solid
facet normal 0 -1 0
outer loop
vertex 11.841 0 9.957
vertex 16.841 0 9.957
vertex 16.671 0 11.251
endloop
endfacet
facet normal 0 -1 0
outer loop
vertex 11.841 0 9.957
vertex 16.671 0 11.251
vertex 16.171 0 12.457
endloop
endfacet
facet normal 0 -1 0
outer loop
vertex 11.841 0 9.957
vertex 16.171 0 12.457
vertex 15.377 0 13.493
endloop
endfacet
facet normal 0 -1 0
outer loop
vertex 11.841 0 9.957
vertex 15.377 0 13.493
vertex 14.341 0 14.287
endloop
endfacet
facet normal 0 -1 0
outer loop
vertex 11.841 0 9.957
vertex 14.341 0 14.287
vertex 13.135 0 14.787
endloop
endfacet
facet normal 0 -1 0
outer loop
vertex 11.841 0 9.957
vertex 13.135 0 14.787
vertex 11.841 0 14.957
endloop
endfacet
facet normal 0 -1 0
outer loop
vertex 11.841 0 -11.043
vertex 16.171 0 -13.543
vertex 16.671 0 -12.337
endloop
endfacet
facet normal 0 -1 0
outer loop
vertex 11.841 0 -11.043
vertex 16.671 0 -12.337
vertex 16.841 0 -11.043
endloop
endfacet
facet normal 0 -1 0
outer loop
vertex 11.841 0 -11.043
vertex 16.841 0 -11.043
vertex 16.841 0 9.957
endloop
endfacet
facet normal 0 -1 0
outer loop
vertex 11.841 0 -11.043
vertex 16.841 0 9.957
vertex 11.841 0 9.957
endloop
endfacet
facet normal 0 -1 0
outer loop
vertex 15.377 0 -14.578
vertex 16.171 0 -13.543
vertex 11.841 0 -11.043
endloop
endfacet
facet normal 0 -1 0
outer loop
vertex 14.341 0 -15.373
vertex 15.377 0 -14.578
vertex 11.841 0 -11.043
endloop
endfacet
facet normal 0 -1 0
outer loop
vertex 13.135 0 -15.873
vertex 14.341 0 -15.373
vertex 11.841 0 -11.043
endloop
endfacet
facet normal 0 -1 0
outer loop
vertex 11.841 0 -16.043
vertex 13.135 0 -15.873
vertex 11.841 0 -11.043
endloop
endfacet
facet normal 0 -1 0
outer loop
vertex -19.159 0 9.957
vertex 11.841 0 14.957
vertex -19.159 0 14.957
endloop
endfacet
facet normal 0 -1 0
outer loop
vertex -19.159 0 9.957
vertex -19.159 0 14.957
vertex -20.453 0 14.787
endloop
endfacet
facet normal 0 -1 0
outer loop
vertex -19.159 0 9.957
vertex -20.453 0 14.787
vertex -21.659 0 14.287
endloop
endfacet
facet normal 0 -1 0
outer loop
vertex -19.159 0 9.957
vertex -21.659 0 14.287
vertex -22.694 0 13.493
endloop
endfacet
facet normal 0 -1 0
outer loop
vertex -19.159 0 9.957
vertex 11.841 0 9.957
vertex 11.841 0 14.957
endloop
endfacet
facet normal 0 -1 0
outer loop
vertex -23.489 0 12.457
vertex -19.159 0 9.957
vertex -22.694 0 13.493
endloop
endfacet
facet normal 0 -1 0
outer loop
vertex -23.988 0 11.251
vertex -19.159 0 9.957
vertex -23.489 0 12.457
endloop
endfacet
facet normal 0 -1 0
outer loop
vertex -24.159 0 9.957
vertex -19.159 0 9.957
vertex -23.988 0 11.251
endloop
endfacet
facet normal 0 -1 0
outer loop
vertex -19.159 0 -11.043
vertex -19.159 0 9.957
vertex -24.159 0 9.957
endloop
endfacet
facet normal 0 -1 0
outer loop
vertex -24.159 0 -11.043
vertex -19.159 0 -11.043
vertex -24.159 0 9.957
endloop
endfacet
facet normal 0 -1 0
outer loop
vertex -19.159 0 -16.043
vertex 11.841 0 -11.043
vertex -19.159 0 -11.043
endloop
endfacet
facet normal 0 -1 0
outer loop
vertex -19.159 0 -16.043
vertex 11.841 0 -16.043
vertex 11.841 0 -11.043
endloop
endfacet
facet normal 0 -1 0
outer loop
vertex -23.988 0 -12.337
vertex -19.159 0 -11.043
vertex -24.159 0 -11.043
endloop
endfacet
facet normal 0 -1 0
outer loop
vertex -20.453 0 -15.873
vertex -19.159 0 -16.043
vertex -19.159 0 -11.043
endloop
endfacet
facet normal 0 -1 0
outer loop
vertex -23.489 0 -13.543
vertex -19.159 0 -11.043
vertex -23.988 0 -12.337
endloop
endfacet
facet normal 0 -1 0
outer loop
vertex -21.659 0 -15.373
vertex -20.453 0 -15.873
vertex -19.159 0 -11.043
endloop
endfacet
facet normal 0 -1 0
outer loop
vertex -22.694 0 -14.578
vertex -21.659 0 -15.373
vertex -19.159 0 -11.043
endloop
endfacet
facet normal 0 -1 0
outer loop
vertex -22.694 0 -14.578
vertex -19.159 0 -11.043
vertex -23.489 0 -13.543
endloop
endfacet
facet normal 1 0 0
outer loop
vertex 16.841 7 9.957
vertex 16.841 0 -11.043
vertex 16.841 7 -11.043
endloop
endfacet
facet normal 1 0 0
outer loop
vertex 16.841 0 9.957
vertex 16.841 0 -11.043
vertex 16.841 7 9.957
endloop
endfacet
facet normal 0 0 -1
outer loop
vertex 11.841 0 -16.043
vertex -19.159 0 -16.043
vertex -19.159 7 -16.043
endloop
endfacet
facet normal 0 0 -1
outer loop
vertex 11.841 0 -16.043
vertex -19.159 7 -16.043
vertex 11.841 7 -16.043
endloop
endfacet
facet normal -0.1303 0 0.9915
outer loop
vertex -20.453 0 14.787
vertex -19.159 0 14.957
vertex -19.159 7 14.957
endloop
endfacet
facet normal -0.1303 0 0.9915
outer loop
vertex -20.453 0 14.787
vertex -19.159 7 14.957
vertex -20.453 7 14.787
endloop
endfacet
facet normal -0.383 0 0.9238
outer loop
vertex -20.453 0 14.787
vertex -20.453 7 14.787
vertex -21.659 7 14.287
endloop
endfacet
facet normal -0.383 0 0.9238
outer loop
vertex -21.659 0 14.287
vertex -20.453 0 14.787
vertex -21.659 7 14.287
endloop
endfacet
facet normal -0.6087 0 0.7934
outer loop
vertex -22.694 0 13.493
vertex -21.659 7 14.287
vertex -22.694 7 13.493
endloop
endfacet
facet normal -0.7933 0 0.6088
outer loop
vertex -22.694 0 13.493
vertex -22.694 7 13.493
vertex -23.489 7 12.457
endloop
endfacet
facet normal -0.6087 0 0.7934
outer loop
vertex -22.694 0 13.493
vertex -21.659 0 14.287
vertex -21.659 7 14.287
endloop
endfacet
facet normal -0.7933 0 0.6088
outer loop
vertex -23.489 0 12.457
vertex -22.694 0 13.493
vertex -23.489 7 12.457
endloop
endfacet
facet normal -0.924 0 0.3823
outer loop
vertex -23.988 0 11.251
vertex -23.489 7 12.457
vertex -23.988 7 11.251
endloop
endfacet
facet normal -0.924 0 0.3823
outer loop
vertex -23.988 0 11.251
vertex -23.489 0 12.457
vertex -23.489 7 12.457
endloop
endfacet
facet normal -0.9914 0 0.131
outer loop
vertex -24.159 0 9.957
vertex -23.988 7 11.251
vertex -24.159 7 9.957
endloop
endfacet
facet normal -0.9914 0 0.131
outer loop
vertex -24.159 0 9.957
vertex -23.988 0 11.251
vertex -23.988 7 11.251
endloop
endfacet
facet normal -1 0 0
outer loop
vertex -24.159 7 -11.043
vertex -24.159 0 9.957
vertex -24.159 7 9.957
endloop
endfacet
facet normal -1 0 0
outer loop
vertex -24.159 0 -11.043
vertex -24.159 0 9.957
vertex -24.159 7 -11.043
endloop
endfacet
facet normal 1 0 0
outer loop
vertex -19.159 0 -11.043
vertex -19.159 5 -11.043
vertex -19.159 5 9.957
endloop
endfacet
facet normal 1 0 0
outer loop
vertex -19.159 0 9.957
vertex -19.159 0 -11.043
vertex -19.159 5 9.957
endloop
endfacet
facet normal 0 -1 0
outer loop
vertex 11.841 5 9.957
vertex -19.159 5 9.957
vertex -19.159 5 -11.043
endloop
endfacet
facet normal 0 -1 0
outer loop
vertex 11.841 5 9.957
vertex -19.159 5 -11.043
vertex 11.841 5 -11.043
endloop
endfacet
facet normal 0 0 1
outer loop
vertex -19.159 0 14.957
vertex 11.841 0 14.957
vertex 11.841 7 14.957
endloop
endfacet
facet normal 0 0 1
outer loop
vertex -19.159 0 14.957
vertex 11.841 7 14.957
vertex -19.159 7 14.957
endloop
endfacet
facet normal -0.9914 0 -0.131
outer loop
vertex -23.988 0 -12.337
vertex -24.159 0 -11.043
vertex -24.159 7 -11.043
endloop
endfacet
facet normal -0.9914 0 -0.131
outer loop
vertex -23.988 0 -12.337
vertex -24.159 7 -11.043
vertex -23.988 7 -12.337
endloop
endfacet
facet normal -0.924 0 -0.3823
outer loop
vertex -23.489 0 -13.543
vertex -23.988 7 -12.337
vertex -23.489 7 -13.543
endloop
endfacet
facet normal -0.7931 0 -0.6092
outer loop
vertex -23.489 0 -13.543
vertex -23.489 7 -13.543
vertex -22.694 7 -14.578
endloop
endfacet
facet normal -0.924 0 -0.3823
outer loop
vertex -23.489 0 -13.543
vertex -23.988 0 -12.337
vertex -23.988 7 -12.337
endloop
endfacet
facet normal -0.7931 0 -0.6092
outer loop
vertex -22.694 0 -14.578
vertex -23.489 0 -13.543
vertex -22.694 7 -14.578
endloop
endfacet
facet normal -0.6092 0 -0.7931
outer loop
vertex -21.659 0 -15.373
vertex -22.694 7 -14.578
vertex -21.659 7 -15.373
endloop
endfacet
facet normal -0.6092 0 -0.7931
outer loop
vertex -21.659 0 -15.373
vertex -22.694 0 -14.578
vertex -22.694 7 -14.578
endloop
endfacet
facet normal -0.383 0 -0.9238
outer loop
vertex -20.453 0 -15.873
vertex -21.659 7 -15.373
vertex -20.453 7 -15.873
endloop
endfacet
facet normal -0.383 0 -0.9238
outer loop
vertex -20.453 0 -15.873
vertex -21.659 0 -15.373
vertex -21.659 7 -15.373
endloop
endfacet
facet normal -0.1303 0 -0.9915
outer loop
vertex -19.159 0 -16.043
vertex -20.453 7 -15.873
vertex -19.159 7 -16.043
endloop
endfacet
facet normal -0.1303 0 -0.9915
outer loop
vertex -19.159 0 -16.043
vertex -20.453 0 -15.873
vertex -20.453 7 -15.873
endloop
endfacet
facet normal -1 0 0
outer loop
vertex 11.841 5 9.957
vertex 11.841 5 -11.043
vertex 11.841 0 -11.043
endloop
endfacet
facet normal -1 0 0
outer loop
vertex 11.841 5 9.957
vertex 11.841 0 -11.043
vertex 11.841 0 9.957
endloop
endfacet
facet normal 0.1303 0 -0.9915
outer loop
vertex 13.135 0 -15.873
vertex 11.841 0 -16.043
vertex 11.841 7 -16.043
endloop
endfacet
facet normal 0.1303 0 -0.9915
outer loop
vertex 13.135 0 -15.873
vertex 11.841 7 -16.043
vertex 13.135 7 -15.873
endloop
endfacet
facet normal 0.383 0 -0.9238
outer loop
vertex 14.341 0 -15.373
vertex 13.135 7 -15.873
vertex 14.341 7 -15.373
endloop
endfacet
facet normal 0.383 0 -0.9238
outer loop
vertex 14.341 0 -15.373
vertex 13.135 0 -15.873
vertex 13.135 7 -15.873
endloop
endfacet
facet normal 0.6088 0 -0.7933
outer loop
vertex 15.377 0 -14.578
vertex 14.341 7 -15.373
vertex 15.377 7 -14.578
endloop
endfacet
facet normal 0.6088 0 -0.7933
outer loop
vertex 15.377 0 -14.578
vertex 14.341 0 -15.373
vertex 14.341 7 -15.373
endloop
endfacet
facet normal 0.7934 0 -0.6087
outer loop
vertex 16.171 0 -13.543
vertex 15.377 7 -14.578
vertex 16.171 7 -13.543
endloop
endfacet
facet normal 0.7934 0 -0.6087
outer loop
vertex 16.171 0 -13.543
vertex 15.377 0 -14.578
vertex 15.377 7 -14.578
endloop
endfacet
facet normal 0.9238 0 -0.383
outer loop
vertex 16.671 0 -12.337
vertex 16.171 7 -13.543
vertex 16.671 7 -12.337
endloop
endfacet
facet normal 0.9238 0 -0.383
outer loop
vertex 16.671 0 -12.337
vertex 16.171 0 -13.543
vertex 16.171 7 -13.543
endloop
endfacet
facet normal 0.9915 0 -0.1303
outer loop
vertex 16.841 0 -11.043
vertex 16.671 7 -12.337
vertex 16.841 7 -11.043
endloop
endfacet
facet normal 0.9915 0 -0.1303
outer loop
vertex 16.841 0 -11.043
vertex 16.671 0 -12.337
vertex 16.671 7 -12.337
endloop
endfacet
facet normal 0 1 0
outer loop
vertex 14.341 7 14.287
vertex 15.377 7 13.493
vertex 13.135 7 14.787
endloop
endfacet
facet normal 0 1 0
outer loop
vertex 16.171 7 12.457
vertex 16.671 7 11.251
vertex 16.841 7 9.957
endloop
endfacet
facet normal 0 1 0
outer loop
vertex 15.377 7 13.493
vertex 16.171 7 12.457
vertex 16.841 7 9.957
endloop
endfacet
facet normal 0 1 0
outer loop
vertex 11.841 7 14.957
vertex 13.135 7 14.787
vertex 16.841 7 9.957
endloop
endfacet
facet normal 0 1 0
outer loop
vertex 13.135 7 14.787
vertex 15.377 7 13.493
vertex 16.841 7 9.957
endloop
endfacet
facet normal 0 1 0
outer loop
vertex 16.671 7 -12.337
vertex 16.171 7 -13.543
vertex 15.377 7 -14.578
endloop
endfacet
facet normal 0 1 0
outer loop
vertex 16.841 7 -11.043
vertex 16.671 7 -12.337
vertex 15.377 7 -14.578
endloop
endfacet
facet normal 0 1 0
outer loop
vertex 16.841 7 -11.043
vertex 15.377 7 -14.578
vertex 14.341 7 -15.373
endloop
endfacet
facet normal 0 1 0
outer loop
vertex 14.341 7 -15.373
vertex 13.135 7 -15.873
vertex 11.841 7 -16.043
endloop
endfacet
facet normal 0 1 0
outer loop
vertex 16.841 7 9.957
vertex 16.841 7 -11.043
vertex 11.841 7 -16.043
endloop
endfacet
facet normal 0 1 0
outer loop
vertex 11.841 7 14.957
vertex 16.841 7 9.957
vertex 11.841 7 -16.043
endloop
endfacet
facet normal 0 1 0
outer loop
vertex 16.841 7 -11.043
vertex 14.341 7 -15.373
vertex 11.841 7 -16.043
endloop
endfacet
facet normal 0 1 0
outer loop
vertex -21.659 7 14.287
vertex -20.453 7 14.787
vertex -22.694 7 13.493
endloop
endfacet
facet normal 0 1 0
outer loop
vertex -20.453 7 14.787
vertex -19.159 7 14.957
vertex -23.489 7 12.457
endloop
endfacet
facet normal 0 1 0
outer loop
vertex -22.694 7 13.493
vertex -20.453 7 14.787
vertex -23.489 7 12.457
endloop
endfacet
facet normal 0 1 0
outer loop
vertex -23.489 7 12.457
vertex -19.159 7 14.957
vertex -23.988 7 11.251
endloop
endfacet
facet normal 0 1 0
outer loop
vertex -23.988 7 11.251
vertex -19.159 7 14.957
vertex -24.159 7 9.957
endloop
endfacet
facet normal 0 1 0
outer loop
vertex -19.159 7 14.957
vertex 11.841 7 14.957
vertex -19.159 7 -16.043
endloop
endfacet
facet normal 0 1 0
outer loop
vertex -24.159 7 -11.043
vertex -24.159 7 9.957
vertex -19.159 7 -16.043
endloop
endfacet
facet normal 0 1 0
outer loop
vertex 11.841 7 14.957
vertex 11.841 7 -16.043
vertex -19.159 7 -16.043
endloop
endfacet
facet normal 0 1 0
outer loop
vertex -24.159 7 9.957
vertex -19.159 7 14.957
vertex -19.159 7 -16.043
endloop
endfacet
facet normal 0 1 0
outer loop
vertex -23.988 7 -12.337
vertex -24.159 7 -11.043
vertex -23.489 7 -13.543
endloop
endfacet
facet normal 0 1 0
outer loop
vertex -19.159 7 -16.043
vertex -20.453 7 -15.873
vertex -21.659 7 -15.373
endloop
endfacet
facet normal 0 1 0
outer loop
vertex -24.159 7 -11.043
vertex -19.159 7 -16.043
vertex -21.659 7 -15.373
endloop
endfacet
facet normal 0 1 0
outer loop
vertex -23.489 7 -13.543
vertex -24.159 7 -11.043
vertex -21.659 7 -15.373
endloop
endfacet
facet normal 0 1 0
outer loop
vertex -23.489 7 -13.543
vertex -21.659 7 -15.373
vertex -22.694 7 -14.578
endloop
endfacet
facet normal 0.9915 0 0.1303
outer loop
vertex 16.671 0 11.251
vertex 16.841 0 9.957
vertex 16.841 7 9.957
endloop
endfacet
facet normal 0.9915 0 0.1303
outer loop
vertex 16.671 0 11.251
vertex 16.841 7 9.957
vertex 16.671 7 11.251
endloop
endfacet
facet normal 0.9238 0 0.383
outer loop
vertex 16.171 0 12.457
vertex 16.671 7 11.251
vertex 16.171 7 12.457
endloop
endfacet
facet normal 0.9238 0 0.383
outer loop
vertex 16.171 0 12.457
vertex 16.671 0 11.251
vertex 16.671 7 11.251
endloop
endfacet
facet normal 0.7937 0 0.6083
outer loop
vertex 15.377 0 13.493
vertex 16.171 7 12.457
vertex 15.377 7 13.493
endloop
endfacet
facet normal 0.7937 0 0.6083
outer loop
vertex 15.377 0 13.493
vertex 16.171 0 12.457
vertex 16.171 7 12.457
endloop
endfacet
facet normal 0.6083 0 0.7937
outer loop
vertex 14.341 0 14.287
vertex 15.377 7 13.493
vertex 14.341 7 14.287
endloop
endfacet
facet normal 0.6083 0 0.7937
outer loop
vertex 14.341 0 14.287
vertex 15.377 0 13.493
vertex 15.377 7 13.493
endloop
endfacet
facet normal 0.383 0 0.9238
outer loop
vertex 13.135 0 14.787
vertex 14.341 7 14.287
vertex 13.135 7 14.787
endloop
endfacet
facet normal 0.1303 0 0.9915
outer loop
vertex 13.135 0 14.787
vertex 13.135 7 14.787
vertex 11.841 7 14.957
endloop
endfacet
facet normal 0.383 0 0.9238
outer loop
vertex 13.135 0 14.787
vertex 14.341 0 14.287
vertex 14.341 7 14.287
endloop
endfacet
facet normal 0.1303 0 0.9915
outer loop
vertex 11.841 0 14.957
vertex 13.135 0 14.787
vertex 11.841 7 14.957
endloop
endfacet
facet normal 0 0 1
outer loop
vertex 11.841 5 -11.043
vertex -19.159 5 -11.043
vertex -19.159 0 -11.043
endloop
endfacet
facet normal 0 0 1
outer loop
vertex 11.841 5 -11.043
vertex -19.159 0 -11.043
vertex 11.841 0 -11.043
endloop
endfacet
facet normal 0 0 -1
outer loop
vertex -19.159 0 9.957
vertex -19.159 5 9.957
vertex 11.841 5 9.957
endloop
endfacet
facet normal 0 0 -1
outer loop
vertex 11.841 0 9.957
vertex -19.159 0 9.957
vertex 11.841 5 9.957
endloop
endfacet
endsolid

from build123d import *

# Parameters (mm, degrees)
BOSS_EXTRUDE1_DEPTH     = 7
CUT_EXTRUDE1_DEPTH      = 4
CUT_EXTRUDE1_DEPTH_BACK = 5
SKETCH2_W               = 31
SKETCH2_H               = 21


with BuildPart() as part:
    # Sketch1 → Boss-Extrude1 (new body)
    with BuildSketch(Plane(origin=(0, 0, 0), x_dir=(1, 0, 0), z_dir=(0, 1, 0))):
        with BuildLine():
            Line((-19.158798283, 16.042918455), (11.841201717, 16.042918455))
            ThreePointArc((11.841201717, 16.042918455), (15.376735623, 14.578452361), (16.841201717, 11.042918455))
            Line((16.841201717, 11.042918455), (16.841201717, -9.957081545))
            ThreePointArc((16.841201717, -9.957081545), (15.376735623, -13.492615451), (11.841201717, -14.957081545))
            Line((11.841201717, -14.957081545), (-19.158798283, -14.957081545))
            ThreePointArc((-19.158798283, -14.957081545), (-22.694332189, -13.492615451), (-24.158798283, -9.957081545))
            Line((-24.158798283, -9.957081545), (-24.158798283, 11.042918455))
            ThreePointArc((-24.158798283, 11.042918455), (-22.694332189, 14.578452361), (-19.158798283, 16.042918455))
        make_face()
    extrude(amount=BOSS_EXTRUDE1_DEPTH)

    # Sketch2 → Cut-Extrude1 (cut, two sides: drawn at the far end of the back side and taken through both)
    with BuildSketch(Plane.XZ.offset(-CUT_EXTRUDE1_DEPTH_BACK)):
        with Locations((-3.658798283, -0.542918455)):
            Rectangle(SKETCH2_W, SKETCH2_H)
    extrude(amount=CUT_EXTRUDE1_DEPTH + CUT_EXTRUDE1_DEPTH_BACK, mode=Mode.SUBTRACT)


solid = part.part
